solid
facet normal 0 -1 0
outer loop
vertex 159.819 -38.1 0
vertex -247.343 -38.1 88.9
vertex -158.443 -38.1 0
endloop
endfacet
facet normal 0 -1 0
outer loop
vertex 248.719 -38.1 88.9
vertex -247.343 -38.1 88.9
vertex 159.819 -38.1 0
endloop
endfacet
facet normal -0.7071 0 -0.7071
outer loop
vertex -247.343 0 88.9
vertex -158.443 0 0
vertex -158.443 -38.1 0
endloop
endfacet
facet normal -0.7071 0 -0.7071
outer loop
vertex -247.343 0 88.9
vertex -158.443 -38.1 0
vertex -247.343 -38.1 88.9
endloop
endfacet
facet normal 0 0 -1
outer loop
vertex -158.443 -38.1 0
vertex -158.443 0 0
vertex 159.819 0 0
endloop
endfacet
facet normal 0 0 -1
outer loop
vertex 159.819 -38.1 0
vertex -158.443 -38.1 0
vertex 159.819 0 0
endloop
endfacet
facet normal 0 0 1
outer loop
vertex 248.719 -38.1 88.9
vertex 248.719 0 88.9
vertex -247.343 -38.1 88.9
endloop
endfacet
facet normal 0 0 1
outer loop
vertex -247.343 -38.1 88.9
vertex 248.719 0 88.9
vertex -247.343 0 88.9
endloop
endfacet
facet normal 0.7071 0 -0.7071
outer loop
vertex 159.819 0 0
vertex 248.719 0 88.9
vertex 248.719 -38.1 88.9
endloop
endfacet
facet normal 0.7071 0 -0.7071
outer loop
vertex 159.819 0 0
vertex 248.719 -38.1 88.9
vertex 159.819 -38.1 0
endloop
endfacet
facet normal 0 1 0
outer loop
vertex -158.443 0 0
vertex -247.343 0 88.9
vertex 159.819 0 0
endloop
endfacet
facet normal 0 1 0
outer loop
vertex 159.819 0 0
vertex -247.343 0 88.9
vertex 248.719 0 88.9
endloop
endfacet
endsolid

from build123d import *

# Parameters (mm, degrees)
F1_DEPTH = 38.1
F2_DEPTH = 38.1
F3_DEPTH = 38.1


with BuildPart() as f1:
    # F0 (on Front) → F1 (new body)
    with BuildSketch(Plane.XZ):
        Polygon((159.819499, 0), (248.719499, 0), (248.719499, 88.9), align=None)
        Polygon((-158.442501, 0), (159.819499, 0), (248.719499, 88.9), (-247.342501, 88.9), align=None)
        Polygon((-247.342501, 0), (-158.442501, 0), (-247.342501, 88.9), align=None)
    extrude(amount=F1_DEPTH)

    # F0 (on Front) → F2 (cut)
    with BuildSketch(Plane.XZ):
        Polygon((-247.342501, 0), (-158.442501, 0), (-247.342501, 88.9), align=None)
    extrude(amount=F2_DEPTH, mode=Mode.SUBTRACT)

    # F0 (on Front) → F3 (cut)
    with BuildSketch(Plane.XZ):
        Polygon((159.819499, 0), (248.719499, 0), (248.719499, 88.9), align=None)
    extrude(amount=F3_DEPTH, mode=Mode.SUBTRACT)


solid = f1.part
